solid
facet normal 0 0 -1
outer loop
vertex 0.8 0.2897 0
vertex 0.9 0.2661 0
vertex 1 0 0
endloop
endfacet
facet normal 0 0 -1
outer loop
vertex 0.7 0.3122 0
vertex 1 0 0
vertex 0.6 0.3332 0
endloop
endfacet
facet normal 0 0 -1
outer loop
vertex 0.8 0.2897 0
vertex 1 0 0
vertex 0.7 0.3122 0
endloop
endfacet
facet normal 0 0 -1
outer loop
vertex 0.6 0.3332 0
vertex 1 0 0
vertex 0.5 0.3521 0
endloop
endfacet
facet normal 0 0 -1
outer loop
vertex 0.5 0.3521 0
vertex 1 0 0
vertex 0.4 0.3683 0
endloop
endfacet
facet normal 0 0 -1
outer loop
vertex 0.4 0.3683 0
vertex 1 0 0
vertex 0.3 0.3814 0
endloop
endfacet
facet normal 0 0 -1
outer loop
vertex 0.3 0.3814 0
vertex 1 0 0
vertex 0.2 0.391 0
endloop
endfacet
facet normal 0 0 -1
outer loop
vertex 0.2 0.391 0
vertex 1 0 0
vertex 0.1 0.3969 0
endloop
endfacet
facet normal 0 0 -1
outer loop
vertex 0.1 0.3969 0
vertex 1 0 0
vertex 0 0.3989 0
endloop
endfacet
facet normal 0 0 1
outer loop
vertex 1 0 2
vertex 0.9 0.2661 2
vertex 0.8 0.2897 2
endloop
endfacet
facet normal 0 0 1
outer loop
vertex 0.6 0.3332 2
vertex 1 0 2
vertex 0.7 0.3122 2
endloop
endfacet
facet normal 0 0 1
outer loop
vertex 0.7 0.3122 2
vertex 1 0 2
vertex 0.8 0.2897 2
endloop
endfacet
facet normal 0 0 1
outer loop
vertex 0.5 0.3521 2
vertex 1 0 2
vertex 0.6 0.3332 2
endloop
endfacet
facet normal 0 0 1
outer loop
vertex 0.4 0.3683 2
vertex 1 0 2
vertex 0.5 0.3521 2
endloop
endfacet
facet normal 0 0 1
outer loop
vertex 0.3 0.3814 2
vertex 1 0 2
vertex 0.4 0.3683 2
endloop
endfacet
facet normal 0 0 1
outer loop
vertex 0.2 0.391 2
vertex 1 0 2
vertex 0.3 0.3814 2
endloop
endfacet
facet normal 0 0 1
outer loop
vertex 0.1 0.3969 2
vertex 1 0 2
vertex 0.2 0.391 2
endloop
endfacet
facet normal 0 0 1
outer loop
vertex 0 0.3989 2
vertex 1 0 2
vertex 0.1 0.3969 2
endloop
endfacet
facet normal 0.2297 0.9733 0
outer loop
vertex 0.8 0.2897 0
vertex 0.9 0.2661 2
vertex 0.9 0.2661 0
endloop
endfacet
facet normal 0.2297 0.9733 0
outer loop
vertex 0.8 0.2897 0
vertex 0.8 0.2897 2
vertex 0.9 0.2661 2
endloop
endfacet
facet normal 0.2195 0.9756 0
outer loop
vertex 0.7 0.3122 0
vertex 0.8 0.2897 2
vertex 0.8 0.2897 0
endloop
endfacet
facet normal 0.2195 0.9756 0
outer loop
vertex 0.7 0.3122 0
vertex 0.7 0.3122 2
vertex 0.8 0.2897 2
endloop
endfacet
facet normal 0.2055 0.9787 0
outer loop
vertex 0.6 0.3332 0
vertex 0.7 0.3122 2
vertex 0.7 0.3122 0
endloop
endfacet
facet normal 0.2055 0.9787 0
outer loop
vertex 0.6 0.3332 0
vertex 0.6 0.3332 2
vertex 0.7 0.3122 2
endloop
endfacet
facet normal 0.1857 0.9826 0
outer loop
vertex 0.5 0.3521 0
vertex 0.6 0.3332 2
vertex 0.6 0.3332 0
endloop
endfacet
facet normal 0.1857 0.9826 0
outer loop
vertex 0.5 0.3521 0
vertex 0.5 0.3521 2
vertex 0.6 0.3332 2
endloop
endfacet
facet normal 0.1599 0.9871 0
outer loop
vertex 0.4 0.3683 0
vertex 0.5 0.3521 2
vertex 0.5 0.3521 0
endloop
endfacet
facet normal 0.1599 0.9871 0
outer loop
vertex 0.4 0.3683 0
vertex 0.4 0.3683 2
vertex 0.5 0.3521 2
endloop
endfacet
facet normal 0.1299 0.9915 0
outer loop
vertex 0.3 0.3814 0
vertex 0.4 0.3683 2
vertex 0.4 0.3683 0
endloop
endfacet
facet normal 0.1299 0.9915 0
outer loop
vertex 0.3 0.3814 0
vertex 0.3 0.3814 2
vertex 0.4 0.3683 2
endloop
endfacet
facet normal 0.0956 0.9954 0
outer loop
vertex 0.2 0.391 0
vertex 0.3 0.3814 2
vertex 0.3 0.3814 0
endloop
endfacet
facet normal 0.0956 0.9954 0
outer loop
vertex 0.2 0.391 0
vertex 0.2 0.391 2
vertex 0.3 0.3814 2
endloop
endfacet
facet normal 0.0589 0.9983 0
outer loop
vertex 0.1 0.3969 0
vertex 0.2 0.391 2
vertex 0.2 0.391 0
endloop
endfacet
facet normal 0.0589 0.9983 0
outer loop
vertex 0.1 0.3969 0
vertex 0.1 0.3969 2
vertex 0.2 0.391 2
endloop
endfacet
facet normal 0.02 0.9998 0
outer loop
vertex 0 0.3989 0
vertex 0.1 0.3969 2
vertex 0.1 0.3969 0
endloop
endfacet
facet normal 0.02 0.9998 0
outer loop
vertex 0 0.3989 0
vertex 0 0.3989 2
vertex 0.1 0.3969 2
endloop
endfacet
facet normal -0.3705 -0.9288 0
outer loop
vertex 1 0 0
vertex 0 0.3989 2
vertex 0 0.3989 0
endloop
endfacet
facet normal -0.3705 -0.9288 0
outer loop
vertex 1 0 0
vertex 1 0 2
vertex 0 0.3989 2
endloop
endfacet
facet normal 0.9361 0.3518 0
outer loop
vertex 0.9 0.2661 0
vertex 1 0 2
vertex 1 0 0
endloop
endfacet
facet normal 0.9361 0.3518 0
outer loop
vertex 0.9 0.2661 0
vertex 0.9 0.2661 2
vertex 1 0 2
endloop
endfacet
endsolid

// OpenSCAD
    points = [
    	[0.0, 0.3989422804014327],
	[0.1, 0.3969525474770118],
	[0.2, 0.3910426939754559],
	[0.30000000000000004, 0.3813878154605241],
	[0.4, 0.36827014030332333],
	[0.5, 0.3520653267642995],
	[0.6000000000000001, 0.33322460289179967],
	[0.7000000000000001, 0.31225393336676127],
	[0.8, 0.28969155276148273],
	[0.9, 0.2660852498987548],
    [1, 0]
    ];
    linear_extrude(2)
        polygon(points);
        
